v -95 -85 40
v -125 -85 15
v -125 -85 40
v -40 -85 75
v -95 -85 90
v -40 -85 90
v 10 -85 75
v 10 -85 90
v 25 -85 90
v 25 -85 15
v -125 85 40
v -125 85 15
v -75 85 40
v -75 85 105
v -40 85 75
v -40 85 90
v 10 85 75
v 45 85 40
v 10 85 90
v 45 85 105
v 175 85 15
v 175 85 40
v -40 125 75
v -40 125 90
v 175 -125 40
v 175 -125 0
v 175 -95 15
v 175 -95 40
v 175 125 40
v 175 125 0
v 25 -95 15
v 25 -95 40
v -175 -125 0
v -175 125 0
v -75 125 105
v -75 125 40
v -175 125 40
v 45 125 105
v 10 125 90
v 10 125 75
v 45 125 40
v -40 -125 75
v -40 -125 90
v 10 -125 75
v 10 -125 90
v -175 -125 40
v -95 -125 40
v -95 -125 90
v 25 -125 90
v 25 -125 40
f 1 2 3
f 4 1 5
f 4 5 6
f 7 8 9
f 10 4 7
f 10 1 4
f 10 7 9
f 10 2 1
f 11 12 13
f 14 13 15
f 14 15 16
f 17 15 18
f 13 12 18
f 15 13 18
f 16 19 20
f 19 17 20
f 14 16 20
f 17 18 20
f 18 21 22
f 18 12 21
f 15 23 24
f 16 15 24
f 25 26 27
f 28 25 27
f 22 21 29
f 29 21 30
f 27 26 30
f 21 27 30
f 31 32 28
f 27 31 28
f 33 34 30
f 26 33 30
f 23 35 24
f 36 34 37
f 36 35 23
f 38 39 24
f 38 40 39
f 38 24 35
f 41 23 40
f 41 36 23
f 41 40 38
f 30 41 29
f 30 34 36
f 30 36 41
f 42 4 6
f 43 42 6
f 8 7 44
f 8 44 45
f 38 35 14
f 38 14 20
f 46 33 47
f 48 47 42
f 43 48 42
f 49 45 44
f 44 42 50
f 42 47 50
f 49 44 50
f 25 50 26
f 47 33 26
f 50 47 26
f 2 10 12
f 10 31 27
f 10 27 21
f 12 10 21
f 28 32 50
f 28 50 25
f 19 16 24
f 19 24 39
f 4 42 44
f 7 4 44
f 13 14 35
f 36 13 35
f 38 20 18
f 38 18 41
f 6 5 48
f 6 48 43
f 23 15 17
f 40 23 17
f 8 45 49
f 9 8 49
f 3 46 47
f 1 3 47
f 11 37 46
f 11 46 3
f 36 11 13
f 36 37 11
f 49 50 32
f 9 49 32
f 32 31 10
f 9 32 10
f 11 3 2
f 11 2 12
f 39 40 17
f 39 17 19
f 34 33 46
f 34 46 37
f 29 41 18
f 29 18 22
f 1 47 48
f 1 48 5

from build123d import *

# Parameters (mm, degrees)
F0_W      = 350
F0_H      = 250
F1_DEPTH  = 40
F2_W      = 170
F2_H      = 25
F3_DEPTH  = 300
F4_W      = 150
F4_H      = 10
F5_DEPTH  = 25
F6_W      = 120
F6_H      = 40
F7_DEPTH  = 50
F8_W      = 120
F8_H      = 40
F9_DEPTH  = 65
F10_W     = 50
F10_H     = 15
F11_DEPTH = 250.001


with BuildPart() as f1:
    # F0 (on Top) → F1 (new body)
    with BuildSketch(Plane.XY):
        Rectangle(F0_W, F0_H)
    extrude(amount=F1_DEPTH)

    # F2 (on face) → F3 (cut)
    with BuildSketch(Plane.YZ.offset(175)):
        with Locations((0, 27.5)):
            Rectangle(F2_W, F2_H)
    extrude(amount=-F3_DEPTH, mode=Mode.SUBTRACT)

    # F4 (on face) → F5 (cut)
    with BuildSketch(Plane.XY.offset(40)):
        with Locations((100, -90)):
            Rectangle(F4_W, F4_H)
    extrude(amount=-F5_DEPTH, mode=Mode.SUBTRACT)

    # F6 (on face) → F7 (join)
    with BuildSketch(Plane.XY.offset(40)):
        with Locations((-35, -105)):
            Rectangle(F6_W, F6_H)
    extrude(amount=F7_DEPTH)

    # F8 (on face) → F9 (join)
    with BuildSketch(Plane.XY.offset(40)):
        with Locations((-15, 105)):
            Rectangle(F8_W, F8_H)
    extrude(amount=F9_DEPTH)

    # F10 (on face) → F11 (cut, through all)
    with BuildSketch(Plane.XZ.offset(125)):
        with Locations((-15, 82.5)):
            Rectangle(F10_W, F10_H)
    extrude(amount=-F11_DEPTH, mode=Mode.SUBTRACT)


solid = f1.part
